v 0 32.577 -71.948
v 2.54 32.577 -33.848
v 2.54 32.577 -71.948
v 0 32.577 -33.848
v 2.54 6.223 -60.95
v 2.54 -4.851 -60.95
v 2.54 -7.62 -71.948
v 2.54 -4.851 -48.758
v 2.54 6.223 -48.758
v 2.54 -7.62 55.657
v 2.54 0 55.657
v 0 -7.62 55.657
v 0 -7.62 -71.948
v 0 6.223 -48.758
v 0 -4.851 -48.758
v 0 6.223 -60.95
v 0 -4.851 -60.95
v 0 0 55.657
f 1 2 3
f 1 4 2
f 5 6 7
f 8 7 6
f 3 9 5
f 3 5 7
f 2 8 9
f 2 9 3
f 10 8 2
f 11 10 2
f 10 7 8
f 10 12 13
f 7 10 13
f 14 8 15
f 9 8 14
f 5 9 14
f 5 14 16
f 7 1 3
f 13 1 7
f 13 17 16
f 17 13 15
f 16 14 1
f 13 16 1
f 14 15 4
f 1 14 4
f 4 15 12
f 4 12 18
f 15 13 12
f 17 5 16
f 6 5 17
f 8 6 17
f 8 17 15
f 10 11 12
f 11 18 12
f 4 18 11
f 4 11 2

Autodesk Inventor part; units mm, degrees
ref_plane "YZ Plane" through (0, 0, 0) normal (1, 0, 0) x (0, 1, 0)
ref_plane "XZ Plane" through (0, 0, 0) normal (0, 1, 0) x (-1, 0, 0)
ref_plane "XY Plane" through (0, 0, 0) normal (0, 0, 1) x (1, 0, 0)
sketch "Sketch1" plane through (0, 0, 0) normal (1, 0, 0) x (0, 1, 0)
  line L0 (0, 55.6574) -> (32.5774, -33.8483)
  line L1 (0, 55.6574) -> (-7.62, 55.6574)
  line L2 (-7.62, 55.6574) -> (-7.62, -33.8483)
  line L3 (32.5774, -33.8483) -> (32.5774, -71.9483)
  line L4 (32.5774, -71.9483) -> (-7.62, -71.9483)
  line L5 (-7.62, -71.9483) -> (-7.62, -33.8483)
  point P0 (0, 0)
  dimension "d1" = 95.25
  dimension "d4" = 20
  dimension "d5" = 7.62
  dimension "d6" = 38.1
extrude "Extrusion1" add sketch "Sketch1" along normal blind 2.54
sketch "Sketch2" plane through (2.54, 0, 0) normal (1, 0, 0) x (0, 0, -1)
  line L0 (48.7581, 6.223) -> (60.9501, 6.223)
  line L1 (60.9501, 6.223) -> (60.9501, -4.8514)
  line L2 (60.9501, -4.8514) -> (48.7581, -4.8514)
  line L3 (48.7581, -4.8514) -> (48.7581, 6.223)
  line L4 (-55.6574, -7.62) -> (71.9483, -7.62) projected
  line L5 (71.9483, -7.62) -> (71.9483, 32.5774) projected
  point P0 (0, 0)
  dimension "d7" = 12.192
  dimension "d8" = 11.0744
  dimension "d11" = 2.7686
  dimension "d12" = 10.9982
extrude "Extrusion2" cut sketch "Sketch2" against normal blind 2.54
properties part number "sideWithHole"
